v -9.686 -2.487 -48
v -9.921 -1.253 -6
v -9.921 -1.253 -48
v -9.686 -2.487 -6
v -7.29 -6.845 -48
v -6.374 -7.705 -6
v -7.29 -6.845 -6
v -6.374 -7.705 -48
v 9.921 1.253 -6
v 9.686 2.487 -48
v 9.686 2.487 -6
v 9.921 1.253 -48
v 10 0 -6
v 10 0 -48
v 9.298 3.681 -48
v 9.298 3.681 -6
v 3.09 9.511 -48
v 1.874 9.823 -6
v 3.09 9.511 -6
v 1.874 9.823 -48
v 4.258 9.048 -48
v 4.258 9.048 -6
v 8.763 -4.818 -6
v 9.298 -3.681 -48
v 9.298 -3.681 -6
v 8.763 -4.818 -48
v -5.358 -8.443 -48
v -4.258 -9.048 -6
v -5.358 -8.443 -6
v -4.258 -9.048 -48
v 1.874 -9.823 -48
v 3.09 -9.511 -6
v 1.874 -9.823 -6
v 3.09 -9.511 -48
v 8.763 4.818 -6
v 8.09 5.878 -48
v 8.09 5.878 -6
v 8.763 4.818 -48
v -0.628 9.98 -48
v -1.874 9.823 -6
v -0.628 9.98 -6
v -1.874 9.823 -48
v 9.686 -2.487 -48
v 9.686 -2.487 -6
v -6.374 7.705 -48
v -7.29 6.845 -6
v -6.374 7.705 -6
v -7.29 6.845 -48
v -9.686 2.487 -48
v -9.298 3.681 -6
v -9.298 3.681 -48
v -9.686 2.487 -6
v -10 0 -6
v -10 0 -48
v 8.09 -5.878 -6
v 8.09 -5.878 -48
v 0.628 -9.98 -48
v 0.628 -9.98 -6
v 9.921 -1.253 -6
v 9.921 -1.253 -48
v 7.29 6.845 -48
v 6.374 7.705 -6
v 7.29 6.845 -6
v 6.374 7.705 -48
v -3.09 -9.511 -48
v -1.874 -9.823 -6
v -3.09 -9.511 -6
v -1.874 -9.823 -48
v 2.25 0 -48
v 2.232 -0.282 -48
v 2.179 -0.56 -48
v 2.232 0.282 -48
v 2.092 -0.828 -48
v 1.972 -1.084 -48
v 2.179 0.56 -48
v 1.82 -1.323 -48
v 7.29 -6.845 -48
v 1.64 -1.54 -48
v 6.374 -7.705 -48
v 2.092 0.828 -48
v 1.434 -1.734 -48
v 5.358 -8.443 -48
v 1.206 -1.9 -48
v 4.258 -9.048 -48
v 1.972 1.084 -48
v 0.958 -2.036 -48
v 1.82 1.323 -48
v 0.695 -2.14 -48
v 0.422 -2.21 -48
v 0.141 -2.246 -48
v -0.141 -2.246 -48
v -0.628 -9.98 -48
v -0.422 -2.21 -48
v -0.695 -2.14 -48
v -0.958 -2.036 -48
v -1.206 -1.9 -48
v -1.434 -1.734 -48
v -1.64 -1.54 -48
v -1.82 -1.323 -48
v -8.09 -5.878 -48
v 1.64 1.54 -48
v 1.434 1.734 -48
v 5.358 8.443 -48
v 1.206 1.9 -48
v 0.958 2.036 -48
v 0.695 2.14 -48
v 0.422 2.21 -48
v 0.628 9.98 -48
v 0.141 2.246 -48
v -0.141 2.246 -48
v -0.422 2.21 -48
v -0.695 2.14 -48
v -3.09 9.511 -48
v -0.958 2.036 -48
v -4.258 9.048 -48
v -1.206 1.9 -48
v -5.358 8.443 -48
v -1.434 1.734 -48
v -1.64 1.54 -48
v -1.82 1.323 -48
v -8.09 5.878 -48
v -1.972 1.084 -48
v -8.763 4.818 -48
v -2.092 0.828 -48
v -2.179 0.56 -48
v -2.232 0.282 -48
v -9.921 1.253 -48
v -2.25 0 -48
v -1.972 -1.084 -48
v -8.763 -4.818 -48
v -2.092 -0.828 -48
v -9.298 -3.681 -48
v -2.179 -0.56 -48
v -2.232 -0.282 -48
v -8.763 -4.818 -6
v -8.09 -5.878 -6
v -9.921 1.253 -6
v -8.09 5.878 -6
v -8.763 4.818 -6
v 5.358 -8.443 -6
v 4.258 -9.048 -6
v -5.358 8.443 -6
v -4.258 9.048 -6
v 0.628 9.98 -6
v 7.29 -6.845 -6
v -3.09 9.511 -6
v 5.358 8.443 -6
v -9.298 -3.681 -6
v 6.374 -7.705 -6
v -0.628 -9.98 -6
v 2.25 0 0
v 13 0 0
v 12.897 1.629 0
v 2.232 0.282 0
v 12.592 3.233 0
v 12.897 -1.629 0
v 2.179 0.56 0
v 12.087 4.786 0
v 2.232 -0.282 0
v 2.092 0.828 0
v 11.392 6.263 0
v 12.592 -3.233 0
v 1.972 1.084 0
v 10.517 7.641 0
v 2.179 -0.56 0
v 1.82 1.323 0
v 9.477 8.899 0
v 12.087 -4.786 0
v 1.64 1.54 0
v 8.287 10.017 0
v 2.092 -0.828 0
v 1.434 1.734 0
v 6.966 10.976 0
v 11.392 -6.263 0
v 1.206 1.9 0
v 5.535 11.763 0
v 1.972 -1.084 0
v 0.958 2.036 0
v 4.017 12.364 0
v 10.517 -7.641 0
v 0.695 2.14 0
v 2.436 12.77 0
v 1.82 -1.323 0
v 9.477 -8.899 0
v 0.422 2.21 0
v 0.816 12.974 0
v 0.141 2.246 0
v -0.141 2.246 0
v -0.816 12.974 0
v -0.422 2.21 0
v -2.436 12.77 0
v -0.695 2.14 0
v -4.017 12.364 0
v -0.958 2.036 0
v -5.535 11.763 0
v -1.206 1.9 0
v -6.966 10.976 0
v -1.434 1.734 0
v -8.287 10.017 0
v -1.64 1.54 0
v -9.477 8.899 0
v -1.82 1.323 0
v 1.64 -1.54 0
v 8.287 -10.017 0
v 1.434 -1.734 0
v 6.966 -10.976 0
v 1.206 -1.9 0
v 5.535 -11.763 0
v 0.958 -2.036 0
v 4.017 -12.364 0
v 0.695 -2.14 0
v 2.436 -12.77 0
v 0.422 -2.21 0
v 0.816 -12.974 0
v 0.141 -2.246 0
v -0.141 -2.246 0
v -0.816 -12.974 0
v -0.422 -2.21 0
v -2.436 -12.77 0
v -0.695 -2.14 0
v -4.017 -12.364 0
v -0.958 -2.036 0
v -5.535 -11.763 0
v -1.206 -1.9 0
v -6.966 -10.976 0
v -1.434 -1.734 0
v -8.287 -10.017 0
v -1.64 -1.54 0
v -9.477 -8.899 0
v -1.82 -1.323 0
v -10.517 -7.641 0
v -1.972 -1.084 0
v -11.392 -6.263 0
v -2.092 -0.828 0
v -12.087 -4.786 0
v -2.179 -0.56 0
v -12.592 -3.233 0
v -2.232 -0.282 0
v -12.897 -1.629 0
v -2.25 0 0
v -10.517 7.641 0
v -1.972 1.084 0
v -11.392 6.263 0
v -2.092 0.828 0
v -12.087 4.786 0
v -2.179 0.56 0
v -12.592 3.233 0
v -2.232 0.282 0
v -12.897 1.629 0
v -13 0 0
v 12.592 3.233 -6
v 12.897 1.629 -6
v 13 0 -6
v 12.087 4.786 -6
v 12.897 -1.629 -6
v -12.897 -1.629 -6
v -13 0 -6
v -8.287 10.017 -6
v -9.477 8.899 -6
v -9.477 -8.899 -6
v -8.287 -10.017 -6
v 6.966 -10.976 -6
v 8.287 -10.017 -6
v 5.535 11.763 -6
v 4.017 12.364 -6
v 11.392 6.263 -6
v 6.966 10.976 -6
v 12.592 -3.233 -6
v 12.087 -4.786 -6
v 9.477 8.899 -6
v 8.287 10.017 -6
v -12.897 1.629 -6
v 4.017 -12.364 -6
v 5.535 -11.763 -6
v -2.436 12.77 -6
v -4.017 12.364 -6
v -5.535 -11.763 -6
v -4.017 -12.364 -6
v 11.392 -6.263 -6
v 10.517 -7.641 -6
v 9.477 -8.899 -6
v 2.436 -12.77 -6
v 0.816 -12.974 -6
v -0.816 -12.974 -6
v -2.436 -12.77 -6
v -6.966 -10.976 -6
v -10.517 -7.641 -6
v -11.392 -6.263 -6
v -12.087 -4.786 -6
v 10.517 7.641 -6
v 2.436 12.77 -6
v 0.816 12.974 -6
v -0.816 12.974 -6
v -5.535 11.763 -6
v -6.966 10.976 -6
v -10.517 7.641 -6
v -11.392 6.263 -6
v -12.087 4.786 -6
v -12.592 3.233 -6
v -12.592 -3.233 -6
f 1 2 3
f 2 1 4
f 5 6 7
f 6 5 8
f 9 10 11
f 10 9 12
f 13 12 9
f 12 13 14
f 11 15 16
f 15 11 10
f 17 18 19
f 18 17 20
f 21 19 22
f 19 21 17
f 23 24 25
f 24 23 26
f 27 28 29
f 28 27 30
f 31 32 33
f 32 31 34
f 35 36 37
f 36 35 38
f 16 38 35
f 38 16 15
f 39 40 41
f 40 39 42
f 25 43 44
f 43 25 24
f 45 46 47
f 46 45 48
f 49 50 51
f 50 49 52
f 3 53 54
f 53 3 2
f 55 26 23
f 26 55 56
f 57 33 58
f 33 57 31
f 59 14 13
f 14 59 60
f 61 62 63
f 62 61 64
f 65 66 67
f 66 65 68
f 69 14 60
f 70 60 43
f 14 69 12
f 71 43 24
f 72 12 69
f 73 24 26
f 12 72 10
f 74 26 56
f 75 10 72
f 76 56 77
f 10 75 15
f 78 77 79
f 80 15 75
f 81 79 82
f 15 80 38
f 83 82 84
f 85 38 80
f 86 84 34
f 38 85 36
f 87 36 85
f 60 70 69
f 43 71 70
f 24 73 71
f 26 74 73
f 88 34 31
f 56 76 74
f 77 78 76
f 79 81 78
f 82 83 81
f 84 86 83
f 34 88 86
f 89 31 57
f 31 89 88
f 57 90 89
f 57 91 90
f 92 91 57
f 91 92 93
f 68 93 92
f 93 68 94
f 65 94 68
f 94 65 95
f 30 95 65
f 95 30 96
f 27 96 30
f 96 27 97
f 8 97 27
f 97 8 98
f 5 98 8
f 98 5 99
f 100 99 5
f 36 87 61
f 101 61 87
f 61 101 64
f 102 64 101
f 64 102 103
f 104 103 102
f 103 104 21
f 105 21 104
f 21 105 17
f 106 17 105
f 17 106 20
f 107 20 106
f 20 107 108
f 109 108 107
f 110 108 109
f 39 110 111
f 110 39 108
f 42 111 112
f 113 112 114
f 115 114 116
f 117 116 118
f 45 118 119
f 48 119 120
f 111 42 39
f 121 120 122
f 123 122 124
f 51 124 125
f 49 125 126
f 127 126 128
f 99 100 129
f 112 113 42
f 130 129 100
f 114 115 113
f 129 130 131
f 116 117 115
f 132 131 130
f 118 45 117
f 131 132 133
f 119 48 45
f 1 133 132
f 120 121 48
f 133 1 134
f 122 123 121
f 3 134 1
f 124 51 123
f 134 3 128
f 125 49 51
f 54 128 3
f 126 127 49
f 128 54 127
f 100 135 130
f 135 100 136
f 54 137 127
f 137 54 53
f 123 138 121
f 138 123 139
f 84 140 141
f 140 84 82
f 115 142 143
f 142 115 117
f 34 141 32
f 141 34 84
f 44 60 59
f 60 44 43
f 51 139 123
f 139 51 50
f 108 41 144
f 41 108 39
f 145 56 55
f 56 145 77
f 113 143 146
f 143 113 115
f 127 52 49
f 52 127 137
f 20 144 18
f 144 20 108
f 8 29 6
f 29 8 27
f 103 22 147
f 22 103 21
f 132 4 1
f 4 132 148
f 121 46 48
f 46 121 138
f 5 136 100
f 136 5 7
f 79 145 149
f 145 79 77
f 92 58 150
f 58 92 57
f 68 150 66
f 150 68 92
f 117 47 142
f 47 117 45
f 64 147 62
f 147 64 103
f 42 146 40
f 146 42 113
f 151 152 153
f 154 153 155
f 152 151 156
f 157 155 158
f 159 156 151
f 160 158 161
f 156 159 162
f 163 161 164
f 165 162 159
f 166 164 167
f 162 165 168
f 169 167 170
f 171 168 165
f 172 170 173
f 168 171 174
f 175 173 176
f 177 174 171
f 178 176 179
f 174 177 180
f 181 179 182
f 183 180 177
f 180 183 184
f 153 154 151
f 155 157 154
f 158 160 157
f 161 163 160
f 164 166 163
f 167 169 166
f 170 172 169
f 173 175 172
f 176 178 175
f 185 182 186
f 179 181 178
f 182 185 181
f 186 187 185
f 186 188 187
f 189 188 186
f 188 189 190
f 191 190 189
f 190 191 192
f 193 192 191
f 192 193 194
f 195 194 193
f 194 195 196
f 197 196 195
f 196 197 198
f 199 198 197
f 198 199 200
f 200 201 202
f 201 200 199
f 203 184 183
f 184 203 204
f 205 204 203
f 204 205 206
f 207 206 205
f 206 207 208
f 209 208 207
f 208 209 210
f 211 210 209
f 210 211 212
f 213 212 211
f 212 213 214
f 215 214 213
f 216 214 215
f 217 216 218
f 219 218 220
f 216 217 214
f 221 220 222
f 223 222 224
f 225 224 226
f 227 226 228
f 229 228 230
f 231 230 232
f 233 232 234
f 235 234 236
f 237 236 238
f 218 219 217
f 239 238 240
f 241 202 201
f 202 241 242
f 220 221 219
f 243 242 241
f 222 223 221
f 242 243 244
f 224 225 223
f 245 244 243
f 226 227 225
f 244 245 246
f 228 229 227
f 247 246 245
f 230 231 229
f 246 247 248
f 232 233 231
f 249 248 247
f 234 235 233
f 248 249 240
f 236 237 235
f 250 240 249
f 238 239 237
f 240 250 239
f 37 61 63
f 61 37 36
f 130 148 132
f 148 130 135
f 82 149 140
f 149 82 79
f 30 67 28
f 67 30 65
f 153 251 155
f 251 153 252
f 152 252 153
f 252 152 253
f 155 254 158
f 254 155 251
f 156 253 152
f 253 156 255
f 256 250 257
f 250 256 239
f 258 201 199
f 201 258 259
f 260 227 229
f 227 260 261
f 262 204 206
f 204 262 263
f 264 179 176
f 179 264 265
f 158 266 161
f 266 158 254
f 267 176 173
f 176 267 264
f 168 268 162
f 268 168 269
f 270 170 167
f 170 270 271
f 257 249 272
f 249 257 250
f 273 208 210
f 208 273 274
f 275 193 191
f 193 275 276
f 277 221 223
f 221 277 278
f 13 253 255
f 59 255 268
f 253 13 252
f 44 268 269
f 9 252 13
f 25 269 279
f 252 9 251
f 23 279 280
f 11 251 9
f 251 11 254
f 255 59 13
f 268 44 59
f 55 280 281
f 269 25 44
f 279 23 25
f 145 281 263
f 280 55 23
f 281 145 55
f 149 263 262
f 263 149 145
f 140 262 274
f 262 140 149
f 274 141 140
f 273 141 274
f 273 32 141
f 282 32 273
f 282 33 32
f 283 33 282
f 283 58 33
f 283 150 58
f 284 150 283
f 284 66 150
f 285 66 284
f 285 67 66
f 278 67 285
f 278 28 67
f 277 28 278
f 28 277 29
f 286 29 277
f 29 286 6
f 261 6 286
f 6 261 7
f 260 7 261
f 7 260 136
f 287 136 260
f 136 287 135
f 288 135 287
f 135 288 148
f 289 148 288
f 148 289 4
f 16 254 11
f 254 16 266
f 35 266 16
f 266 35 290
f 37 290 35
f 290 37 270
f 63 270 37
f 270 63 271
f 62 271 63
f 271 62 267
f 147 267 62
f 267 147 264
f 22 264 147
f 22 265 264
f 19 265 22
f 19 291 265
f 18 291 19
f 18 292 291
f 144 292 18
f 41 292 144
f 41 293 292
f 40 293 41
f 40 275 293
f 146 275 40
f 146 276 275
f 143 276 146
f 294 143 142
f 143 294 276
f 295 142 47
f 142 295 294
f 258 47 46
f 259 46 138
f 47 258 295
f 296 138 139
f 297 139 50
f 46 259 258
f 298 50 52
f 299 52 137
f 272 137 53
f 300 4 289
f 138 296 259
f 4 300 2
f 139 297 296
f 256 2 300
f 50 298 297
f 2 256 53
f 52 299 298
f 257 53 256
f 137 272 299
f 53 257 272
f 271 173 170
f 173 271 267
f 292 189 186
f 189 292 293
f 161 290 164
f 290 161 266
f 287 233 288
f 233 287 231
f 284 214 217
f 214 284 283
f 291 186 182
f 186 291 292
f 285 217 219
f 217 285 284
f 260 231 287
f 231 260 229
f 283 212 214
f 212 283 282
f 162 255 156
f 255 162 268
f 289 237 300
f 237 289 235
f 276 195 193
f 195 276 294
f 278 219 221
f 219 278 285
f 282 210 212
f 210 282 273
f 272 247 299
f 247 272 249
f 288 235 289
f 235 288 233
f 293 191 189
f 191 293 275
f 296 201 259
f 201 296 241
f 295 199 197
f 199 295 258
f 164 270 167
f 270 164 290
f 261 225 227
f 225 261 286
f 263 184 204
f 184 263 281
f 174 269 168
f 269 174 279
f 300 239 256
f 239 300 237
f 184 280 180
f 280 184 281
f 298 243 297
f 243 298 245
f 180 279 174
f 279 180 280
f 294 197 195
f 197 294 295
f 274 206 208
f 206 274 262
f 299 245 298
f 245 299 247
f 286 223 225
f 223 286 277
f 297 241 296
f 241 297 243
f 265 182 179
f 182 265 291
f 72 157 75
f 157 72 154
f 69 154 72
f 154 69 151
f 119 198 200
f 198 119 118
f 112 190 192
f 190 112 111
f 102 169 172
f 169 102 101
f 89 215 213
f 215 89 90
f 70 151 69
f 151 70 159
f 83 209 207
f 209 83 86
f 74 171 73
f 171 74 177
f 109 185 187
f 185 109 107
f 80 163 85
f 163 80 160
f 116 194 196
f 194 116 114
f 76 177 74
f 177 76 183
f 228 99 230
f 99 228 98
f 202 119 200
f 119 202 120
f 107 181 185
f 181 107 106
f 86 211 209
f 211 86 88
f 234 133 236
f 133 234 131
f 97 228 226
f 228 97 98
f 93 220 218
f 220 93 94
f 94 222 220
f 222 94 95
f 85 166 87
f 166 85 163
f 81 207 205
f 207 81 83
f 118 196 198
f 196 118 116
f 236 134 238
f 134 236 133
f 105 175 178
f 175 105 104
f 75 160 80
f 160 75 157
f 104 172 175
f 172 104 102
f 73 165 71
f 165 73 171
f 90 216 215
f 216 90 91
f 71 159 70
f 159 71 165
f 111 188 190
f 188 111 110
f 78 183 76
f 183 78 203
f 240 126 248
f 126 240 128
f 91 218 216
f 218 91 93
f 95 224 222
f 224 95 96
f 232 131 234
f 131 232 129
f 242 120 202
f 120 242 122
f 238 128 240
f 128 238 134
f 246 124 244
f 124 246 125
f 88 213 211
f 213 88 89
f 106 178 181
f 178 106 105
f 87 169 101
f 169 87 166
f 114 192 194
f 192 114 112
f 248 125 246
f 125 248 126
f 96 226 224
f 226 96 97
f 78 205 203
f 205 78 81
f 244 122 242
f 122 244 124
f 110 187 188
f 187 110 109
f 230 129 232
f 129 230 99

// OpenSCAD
$fn = 50;


difference() {
	union() {
		translate(v = [0, 0, -48.0000000000]) {
			cylinder(h = 48, r = 10.0000000000);
		}
		translate(v = [0, 0, -6.0000000000]) {
			cylinder(h = 6, r = 13.0000000000);
		}
	}
	union() {
		#translate(v = [0, 0, -48]) {
			cylinder(h = 48, r = 2.2500000000);
		}
	}
}
